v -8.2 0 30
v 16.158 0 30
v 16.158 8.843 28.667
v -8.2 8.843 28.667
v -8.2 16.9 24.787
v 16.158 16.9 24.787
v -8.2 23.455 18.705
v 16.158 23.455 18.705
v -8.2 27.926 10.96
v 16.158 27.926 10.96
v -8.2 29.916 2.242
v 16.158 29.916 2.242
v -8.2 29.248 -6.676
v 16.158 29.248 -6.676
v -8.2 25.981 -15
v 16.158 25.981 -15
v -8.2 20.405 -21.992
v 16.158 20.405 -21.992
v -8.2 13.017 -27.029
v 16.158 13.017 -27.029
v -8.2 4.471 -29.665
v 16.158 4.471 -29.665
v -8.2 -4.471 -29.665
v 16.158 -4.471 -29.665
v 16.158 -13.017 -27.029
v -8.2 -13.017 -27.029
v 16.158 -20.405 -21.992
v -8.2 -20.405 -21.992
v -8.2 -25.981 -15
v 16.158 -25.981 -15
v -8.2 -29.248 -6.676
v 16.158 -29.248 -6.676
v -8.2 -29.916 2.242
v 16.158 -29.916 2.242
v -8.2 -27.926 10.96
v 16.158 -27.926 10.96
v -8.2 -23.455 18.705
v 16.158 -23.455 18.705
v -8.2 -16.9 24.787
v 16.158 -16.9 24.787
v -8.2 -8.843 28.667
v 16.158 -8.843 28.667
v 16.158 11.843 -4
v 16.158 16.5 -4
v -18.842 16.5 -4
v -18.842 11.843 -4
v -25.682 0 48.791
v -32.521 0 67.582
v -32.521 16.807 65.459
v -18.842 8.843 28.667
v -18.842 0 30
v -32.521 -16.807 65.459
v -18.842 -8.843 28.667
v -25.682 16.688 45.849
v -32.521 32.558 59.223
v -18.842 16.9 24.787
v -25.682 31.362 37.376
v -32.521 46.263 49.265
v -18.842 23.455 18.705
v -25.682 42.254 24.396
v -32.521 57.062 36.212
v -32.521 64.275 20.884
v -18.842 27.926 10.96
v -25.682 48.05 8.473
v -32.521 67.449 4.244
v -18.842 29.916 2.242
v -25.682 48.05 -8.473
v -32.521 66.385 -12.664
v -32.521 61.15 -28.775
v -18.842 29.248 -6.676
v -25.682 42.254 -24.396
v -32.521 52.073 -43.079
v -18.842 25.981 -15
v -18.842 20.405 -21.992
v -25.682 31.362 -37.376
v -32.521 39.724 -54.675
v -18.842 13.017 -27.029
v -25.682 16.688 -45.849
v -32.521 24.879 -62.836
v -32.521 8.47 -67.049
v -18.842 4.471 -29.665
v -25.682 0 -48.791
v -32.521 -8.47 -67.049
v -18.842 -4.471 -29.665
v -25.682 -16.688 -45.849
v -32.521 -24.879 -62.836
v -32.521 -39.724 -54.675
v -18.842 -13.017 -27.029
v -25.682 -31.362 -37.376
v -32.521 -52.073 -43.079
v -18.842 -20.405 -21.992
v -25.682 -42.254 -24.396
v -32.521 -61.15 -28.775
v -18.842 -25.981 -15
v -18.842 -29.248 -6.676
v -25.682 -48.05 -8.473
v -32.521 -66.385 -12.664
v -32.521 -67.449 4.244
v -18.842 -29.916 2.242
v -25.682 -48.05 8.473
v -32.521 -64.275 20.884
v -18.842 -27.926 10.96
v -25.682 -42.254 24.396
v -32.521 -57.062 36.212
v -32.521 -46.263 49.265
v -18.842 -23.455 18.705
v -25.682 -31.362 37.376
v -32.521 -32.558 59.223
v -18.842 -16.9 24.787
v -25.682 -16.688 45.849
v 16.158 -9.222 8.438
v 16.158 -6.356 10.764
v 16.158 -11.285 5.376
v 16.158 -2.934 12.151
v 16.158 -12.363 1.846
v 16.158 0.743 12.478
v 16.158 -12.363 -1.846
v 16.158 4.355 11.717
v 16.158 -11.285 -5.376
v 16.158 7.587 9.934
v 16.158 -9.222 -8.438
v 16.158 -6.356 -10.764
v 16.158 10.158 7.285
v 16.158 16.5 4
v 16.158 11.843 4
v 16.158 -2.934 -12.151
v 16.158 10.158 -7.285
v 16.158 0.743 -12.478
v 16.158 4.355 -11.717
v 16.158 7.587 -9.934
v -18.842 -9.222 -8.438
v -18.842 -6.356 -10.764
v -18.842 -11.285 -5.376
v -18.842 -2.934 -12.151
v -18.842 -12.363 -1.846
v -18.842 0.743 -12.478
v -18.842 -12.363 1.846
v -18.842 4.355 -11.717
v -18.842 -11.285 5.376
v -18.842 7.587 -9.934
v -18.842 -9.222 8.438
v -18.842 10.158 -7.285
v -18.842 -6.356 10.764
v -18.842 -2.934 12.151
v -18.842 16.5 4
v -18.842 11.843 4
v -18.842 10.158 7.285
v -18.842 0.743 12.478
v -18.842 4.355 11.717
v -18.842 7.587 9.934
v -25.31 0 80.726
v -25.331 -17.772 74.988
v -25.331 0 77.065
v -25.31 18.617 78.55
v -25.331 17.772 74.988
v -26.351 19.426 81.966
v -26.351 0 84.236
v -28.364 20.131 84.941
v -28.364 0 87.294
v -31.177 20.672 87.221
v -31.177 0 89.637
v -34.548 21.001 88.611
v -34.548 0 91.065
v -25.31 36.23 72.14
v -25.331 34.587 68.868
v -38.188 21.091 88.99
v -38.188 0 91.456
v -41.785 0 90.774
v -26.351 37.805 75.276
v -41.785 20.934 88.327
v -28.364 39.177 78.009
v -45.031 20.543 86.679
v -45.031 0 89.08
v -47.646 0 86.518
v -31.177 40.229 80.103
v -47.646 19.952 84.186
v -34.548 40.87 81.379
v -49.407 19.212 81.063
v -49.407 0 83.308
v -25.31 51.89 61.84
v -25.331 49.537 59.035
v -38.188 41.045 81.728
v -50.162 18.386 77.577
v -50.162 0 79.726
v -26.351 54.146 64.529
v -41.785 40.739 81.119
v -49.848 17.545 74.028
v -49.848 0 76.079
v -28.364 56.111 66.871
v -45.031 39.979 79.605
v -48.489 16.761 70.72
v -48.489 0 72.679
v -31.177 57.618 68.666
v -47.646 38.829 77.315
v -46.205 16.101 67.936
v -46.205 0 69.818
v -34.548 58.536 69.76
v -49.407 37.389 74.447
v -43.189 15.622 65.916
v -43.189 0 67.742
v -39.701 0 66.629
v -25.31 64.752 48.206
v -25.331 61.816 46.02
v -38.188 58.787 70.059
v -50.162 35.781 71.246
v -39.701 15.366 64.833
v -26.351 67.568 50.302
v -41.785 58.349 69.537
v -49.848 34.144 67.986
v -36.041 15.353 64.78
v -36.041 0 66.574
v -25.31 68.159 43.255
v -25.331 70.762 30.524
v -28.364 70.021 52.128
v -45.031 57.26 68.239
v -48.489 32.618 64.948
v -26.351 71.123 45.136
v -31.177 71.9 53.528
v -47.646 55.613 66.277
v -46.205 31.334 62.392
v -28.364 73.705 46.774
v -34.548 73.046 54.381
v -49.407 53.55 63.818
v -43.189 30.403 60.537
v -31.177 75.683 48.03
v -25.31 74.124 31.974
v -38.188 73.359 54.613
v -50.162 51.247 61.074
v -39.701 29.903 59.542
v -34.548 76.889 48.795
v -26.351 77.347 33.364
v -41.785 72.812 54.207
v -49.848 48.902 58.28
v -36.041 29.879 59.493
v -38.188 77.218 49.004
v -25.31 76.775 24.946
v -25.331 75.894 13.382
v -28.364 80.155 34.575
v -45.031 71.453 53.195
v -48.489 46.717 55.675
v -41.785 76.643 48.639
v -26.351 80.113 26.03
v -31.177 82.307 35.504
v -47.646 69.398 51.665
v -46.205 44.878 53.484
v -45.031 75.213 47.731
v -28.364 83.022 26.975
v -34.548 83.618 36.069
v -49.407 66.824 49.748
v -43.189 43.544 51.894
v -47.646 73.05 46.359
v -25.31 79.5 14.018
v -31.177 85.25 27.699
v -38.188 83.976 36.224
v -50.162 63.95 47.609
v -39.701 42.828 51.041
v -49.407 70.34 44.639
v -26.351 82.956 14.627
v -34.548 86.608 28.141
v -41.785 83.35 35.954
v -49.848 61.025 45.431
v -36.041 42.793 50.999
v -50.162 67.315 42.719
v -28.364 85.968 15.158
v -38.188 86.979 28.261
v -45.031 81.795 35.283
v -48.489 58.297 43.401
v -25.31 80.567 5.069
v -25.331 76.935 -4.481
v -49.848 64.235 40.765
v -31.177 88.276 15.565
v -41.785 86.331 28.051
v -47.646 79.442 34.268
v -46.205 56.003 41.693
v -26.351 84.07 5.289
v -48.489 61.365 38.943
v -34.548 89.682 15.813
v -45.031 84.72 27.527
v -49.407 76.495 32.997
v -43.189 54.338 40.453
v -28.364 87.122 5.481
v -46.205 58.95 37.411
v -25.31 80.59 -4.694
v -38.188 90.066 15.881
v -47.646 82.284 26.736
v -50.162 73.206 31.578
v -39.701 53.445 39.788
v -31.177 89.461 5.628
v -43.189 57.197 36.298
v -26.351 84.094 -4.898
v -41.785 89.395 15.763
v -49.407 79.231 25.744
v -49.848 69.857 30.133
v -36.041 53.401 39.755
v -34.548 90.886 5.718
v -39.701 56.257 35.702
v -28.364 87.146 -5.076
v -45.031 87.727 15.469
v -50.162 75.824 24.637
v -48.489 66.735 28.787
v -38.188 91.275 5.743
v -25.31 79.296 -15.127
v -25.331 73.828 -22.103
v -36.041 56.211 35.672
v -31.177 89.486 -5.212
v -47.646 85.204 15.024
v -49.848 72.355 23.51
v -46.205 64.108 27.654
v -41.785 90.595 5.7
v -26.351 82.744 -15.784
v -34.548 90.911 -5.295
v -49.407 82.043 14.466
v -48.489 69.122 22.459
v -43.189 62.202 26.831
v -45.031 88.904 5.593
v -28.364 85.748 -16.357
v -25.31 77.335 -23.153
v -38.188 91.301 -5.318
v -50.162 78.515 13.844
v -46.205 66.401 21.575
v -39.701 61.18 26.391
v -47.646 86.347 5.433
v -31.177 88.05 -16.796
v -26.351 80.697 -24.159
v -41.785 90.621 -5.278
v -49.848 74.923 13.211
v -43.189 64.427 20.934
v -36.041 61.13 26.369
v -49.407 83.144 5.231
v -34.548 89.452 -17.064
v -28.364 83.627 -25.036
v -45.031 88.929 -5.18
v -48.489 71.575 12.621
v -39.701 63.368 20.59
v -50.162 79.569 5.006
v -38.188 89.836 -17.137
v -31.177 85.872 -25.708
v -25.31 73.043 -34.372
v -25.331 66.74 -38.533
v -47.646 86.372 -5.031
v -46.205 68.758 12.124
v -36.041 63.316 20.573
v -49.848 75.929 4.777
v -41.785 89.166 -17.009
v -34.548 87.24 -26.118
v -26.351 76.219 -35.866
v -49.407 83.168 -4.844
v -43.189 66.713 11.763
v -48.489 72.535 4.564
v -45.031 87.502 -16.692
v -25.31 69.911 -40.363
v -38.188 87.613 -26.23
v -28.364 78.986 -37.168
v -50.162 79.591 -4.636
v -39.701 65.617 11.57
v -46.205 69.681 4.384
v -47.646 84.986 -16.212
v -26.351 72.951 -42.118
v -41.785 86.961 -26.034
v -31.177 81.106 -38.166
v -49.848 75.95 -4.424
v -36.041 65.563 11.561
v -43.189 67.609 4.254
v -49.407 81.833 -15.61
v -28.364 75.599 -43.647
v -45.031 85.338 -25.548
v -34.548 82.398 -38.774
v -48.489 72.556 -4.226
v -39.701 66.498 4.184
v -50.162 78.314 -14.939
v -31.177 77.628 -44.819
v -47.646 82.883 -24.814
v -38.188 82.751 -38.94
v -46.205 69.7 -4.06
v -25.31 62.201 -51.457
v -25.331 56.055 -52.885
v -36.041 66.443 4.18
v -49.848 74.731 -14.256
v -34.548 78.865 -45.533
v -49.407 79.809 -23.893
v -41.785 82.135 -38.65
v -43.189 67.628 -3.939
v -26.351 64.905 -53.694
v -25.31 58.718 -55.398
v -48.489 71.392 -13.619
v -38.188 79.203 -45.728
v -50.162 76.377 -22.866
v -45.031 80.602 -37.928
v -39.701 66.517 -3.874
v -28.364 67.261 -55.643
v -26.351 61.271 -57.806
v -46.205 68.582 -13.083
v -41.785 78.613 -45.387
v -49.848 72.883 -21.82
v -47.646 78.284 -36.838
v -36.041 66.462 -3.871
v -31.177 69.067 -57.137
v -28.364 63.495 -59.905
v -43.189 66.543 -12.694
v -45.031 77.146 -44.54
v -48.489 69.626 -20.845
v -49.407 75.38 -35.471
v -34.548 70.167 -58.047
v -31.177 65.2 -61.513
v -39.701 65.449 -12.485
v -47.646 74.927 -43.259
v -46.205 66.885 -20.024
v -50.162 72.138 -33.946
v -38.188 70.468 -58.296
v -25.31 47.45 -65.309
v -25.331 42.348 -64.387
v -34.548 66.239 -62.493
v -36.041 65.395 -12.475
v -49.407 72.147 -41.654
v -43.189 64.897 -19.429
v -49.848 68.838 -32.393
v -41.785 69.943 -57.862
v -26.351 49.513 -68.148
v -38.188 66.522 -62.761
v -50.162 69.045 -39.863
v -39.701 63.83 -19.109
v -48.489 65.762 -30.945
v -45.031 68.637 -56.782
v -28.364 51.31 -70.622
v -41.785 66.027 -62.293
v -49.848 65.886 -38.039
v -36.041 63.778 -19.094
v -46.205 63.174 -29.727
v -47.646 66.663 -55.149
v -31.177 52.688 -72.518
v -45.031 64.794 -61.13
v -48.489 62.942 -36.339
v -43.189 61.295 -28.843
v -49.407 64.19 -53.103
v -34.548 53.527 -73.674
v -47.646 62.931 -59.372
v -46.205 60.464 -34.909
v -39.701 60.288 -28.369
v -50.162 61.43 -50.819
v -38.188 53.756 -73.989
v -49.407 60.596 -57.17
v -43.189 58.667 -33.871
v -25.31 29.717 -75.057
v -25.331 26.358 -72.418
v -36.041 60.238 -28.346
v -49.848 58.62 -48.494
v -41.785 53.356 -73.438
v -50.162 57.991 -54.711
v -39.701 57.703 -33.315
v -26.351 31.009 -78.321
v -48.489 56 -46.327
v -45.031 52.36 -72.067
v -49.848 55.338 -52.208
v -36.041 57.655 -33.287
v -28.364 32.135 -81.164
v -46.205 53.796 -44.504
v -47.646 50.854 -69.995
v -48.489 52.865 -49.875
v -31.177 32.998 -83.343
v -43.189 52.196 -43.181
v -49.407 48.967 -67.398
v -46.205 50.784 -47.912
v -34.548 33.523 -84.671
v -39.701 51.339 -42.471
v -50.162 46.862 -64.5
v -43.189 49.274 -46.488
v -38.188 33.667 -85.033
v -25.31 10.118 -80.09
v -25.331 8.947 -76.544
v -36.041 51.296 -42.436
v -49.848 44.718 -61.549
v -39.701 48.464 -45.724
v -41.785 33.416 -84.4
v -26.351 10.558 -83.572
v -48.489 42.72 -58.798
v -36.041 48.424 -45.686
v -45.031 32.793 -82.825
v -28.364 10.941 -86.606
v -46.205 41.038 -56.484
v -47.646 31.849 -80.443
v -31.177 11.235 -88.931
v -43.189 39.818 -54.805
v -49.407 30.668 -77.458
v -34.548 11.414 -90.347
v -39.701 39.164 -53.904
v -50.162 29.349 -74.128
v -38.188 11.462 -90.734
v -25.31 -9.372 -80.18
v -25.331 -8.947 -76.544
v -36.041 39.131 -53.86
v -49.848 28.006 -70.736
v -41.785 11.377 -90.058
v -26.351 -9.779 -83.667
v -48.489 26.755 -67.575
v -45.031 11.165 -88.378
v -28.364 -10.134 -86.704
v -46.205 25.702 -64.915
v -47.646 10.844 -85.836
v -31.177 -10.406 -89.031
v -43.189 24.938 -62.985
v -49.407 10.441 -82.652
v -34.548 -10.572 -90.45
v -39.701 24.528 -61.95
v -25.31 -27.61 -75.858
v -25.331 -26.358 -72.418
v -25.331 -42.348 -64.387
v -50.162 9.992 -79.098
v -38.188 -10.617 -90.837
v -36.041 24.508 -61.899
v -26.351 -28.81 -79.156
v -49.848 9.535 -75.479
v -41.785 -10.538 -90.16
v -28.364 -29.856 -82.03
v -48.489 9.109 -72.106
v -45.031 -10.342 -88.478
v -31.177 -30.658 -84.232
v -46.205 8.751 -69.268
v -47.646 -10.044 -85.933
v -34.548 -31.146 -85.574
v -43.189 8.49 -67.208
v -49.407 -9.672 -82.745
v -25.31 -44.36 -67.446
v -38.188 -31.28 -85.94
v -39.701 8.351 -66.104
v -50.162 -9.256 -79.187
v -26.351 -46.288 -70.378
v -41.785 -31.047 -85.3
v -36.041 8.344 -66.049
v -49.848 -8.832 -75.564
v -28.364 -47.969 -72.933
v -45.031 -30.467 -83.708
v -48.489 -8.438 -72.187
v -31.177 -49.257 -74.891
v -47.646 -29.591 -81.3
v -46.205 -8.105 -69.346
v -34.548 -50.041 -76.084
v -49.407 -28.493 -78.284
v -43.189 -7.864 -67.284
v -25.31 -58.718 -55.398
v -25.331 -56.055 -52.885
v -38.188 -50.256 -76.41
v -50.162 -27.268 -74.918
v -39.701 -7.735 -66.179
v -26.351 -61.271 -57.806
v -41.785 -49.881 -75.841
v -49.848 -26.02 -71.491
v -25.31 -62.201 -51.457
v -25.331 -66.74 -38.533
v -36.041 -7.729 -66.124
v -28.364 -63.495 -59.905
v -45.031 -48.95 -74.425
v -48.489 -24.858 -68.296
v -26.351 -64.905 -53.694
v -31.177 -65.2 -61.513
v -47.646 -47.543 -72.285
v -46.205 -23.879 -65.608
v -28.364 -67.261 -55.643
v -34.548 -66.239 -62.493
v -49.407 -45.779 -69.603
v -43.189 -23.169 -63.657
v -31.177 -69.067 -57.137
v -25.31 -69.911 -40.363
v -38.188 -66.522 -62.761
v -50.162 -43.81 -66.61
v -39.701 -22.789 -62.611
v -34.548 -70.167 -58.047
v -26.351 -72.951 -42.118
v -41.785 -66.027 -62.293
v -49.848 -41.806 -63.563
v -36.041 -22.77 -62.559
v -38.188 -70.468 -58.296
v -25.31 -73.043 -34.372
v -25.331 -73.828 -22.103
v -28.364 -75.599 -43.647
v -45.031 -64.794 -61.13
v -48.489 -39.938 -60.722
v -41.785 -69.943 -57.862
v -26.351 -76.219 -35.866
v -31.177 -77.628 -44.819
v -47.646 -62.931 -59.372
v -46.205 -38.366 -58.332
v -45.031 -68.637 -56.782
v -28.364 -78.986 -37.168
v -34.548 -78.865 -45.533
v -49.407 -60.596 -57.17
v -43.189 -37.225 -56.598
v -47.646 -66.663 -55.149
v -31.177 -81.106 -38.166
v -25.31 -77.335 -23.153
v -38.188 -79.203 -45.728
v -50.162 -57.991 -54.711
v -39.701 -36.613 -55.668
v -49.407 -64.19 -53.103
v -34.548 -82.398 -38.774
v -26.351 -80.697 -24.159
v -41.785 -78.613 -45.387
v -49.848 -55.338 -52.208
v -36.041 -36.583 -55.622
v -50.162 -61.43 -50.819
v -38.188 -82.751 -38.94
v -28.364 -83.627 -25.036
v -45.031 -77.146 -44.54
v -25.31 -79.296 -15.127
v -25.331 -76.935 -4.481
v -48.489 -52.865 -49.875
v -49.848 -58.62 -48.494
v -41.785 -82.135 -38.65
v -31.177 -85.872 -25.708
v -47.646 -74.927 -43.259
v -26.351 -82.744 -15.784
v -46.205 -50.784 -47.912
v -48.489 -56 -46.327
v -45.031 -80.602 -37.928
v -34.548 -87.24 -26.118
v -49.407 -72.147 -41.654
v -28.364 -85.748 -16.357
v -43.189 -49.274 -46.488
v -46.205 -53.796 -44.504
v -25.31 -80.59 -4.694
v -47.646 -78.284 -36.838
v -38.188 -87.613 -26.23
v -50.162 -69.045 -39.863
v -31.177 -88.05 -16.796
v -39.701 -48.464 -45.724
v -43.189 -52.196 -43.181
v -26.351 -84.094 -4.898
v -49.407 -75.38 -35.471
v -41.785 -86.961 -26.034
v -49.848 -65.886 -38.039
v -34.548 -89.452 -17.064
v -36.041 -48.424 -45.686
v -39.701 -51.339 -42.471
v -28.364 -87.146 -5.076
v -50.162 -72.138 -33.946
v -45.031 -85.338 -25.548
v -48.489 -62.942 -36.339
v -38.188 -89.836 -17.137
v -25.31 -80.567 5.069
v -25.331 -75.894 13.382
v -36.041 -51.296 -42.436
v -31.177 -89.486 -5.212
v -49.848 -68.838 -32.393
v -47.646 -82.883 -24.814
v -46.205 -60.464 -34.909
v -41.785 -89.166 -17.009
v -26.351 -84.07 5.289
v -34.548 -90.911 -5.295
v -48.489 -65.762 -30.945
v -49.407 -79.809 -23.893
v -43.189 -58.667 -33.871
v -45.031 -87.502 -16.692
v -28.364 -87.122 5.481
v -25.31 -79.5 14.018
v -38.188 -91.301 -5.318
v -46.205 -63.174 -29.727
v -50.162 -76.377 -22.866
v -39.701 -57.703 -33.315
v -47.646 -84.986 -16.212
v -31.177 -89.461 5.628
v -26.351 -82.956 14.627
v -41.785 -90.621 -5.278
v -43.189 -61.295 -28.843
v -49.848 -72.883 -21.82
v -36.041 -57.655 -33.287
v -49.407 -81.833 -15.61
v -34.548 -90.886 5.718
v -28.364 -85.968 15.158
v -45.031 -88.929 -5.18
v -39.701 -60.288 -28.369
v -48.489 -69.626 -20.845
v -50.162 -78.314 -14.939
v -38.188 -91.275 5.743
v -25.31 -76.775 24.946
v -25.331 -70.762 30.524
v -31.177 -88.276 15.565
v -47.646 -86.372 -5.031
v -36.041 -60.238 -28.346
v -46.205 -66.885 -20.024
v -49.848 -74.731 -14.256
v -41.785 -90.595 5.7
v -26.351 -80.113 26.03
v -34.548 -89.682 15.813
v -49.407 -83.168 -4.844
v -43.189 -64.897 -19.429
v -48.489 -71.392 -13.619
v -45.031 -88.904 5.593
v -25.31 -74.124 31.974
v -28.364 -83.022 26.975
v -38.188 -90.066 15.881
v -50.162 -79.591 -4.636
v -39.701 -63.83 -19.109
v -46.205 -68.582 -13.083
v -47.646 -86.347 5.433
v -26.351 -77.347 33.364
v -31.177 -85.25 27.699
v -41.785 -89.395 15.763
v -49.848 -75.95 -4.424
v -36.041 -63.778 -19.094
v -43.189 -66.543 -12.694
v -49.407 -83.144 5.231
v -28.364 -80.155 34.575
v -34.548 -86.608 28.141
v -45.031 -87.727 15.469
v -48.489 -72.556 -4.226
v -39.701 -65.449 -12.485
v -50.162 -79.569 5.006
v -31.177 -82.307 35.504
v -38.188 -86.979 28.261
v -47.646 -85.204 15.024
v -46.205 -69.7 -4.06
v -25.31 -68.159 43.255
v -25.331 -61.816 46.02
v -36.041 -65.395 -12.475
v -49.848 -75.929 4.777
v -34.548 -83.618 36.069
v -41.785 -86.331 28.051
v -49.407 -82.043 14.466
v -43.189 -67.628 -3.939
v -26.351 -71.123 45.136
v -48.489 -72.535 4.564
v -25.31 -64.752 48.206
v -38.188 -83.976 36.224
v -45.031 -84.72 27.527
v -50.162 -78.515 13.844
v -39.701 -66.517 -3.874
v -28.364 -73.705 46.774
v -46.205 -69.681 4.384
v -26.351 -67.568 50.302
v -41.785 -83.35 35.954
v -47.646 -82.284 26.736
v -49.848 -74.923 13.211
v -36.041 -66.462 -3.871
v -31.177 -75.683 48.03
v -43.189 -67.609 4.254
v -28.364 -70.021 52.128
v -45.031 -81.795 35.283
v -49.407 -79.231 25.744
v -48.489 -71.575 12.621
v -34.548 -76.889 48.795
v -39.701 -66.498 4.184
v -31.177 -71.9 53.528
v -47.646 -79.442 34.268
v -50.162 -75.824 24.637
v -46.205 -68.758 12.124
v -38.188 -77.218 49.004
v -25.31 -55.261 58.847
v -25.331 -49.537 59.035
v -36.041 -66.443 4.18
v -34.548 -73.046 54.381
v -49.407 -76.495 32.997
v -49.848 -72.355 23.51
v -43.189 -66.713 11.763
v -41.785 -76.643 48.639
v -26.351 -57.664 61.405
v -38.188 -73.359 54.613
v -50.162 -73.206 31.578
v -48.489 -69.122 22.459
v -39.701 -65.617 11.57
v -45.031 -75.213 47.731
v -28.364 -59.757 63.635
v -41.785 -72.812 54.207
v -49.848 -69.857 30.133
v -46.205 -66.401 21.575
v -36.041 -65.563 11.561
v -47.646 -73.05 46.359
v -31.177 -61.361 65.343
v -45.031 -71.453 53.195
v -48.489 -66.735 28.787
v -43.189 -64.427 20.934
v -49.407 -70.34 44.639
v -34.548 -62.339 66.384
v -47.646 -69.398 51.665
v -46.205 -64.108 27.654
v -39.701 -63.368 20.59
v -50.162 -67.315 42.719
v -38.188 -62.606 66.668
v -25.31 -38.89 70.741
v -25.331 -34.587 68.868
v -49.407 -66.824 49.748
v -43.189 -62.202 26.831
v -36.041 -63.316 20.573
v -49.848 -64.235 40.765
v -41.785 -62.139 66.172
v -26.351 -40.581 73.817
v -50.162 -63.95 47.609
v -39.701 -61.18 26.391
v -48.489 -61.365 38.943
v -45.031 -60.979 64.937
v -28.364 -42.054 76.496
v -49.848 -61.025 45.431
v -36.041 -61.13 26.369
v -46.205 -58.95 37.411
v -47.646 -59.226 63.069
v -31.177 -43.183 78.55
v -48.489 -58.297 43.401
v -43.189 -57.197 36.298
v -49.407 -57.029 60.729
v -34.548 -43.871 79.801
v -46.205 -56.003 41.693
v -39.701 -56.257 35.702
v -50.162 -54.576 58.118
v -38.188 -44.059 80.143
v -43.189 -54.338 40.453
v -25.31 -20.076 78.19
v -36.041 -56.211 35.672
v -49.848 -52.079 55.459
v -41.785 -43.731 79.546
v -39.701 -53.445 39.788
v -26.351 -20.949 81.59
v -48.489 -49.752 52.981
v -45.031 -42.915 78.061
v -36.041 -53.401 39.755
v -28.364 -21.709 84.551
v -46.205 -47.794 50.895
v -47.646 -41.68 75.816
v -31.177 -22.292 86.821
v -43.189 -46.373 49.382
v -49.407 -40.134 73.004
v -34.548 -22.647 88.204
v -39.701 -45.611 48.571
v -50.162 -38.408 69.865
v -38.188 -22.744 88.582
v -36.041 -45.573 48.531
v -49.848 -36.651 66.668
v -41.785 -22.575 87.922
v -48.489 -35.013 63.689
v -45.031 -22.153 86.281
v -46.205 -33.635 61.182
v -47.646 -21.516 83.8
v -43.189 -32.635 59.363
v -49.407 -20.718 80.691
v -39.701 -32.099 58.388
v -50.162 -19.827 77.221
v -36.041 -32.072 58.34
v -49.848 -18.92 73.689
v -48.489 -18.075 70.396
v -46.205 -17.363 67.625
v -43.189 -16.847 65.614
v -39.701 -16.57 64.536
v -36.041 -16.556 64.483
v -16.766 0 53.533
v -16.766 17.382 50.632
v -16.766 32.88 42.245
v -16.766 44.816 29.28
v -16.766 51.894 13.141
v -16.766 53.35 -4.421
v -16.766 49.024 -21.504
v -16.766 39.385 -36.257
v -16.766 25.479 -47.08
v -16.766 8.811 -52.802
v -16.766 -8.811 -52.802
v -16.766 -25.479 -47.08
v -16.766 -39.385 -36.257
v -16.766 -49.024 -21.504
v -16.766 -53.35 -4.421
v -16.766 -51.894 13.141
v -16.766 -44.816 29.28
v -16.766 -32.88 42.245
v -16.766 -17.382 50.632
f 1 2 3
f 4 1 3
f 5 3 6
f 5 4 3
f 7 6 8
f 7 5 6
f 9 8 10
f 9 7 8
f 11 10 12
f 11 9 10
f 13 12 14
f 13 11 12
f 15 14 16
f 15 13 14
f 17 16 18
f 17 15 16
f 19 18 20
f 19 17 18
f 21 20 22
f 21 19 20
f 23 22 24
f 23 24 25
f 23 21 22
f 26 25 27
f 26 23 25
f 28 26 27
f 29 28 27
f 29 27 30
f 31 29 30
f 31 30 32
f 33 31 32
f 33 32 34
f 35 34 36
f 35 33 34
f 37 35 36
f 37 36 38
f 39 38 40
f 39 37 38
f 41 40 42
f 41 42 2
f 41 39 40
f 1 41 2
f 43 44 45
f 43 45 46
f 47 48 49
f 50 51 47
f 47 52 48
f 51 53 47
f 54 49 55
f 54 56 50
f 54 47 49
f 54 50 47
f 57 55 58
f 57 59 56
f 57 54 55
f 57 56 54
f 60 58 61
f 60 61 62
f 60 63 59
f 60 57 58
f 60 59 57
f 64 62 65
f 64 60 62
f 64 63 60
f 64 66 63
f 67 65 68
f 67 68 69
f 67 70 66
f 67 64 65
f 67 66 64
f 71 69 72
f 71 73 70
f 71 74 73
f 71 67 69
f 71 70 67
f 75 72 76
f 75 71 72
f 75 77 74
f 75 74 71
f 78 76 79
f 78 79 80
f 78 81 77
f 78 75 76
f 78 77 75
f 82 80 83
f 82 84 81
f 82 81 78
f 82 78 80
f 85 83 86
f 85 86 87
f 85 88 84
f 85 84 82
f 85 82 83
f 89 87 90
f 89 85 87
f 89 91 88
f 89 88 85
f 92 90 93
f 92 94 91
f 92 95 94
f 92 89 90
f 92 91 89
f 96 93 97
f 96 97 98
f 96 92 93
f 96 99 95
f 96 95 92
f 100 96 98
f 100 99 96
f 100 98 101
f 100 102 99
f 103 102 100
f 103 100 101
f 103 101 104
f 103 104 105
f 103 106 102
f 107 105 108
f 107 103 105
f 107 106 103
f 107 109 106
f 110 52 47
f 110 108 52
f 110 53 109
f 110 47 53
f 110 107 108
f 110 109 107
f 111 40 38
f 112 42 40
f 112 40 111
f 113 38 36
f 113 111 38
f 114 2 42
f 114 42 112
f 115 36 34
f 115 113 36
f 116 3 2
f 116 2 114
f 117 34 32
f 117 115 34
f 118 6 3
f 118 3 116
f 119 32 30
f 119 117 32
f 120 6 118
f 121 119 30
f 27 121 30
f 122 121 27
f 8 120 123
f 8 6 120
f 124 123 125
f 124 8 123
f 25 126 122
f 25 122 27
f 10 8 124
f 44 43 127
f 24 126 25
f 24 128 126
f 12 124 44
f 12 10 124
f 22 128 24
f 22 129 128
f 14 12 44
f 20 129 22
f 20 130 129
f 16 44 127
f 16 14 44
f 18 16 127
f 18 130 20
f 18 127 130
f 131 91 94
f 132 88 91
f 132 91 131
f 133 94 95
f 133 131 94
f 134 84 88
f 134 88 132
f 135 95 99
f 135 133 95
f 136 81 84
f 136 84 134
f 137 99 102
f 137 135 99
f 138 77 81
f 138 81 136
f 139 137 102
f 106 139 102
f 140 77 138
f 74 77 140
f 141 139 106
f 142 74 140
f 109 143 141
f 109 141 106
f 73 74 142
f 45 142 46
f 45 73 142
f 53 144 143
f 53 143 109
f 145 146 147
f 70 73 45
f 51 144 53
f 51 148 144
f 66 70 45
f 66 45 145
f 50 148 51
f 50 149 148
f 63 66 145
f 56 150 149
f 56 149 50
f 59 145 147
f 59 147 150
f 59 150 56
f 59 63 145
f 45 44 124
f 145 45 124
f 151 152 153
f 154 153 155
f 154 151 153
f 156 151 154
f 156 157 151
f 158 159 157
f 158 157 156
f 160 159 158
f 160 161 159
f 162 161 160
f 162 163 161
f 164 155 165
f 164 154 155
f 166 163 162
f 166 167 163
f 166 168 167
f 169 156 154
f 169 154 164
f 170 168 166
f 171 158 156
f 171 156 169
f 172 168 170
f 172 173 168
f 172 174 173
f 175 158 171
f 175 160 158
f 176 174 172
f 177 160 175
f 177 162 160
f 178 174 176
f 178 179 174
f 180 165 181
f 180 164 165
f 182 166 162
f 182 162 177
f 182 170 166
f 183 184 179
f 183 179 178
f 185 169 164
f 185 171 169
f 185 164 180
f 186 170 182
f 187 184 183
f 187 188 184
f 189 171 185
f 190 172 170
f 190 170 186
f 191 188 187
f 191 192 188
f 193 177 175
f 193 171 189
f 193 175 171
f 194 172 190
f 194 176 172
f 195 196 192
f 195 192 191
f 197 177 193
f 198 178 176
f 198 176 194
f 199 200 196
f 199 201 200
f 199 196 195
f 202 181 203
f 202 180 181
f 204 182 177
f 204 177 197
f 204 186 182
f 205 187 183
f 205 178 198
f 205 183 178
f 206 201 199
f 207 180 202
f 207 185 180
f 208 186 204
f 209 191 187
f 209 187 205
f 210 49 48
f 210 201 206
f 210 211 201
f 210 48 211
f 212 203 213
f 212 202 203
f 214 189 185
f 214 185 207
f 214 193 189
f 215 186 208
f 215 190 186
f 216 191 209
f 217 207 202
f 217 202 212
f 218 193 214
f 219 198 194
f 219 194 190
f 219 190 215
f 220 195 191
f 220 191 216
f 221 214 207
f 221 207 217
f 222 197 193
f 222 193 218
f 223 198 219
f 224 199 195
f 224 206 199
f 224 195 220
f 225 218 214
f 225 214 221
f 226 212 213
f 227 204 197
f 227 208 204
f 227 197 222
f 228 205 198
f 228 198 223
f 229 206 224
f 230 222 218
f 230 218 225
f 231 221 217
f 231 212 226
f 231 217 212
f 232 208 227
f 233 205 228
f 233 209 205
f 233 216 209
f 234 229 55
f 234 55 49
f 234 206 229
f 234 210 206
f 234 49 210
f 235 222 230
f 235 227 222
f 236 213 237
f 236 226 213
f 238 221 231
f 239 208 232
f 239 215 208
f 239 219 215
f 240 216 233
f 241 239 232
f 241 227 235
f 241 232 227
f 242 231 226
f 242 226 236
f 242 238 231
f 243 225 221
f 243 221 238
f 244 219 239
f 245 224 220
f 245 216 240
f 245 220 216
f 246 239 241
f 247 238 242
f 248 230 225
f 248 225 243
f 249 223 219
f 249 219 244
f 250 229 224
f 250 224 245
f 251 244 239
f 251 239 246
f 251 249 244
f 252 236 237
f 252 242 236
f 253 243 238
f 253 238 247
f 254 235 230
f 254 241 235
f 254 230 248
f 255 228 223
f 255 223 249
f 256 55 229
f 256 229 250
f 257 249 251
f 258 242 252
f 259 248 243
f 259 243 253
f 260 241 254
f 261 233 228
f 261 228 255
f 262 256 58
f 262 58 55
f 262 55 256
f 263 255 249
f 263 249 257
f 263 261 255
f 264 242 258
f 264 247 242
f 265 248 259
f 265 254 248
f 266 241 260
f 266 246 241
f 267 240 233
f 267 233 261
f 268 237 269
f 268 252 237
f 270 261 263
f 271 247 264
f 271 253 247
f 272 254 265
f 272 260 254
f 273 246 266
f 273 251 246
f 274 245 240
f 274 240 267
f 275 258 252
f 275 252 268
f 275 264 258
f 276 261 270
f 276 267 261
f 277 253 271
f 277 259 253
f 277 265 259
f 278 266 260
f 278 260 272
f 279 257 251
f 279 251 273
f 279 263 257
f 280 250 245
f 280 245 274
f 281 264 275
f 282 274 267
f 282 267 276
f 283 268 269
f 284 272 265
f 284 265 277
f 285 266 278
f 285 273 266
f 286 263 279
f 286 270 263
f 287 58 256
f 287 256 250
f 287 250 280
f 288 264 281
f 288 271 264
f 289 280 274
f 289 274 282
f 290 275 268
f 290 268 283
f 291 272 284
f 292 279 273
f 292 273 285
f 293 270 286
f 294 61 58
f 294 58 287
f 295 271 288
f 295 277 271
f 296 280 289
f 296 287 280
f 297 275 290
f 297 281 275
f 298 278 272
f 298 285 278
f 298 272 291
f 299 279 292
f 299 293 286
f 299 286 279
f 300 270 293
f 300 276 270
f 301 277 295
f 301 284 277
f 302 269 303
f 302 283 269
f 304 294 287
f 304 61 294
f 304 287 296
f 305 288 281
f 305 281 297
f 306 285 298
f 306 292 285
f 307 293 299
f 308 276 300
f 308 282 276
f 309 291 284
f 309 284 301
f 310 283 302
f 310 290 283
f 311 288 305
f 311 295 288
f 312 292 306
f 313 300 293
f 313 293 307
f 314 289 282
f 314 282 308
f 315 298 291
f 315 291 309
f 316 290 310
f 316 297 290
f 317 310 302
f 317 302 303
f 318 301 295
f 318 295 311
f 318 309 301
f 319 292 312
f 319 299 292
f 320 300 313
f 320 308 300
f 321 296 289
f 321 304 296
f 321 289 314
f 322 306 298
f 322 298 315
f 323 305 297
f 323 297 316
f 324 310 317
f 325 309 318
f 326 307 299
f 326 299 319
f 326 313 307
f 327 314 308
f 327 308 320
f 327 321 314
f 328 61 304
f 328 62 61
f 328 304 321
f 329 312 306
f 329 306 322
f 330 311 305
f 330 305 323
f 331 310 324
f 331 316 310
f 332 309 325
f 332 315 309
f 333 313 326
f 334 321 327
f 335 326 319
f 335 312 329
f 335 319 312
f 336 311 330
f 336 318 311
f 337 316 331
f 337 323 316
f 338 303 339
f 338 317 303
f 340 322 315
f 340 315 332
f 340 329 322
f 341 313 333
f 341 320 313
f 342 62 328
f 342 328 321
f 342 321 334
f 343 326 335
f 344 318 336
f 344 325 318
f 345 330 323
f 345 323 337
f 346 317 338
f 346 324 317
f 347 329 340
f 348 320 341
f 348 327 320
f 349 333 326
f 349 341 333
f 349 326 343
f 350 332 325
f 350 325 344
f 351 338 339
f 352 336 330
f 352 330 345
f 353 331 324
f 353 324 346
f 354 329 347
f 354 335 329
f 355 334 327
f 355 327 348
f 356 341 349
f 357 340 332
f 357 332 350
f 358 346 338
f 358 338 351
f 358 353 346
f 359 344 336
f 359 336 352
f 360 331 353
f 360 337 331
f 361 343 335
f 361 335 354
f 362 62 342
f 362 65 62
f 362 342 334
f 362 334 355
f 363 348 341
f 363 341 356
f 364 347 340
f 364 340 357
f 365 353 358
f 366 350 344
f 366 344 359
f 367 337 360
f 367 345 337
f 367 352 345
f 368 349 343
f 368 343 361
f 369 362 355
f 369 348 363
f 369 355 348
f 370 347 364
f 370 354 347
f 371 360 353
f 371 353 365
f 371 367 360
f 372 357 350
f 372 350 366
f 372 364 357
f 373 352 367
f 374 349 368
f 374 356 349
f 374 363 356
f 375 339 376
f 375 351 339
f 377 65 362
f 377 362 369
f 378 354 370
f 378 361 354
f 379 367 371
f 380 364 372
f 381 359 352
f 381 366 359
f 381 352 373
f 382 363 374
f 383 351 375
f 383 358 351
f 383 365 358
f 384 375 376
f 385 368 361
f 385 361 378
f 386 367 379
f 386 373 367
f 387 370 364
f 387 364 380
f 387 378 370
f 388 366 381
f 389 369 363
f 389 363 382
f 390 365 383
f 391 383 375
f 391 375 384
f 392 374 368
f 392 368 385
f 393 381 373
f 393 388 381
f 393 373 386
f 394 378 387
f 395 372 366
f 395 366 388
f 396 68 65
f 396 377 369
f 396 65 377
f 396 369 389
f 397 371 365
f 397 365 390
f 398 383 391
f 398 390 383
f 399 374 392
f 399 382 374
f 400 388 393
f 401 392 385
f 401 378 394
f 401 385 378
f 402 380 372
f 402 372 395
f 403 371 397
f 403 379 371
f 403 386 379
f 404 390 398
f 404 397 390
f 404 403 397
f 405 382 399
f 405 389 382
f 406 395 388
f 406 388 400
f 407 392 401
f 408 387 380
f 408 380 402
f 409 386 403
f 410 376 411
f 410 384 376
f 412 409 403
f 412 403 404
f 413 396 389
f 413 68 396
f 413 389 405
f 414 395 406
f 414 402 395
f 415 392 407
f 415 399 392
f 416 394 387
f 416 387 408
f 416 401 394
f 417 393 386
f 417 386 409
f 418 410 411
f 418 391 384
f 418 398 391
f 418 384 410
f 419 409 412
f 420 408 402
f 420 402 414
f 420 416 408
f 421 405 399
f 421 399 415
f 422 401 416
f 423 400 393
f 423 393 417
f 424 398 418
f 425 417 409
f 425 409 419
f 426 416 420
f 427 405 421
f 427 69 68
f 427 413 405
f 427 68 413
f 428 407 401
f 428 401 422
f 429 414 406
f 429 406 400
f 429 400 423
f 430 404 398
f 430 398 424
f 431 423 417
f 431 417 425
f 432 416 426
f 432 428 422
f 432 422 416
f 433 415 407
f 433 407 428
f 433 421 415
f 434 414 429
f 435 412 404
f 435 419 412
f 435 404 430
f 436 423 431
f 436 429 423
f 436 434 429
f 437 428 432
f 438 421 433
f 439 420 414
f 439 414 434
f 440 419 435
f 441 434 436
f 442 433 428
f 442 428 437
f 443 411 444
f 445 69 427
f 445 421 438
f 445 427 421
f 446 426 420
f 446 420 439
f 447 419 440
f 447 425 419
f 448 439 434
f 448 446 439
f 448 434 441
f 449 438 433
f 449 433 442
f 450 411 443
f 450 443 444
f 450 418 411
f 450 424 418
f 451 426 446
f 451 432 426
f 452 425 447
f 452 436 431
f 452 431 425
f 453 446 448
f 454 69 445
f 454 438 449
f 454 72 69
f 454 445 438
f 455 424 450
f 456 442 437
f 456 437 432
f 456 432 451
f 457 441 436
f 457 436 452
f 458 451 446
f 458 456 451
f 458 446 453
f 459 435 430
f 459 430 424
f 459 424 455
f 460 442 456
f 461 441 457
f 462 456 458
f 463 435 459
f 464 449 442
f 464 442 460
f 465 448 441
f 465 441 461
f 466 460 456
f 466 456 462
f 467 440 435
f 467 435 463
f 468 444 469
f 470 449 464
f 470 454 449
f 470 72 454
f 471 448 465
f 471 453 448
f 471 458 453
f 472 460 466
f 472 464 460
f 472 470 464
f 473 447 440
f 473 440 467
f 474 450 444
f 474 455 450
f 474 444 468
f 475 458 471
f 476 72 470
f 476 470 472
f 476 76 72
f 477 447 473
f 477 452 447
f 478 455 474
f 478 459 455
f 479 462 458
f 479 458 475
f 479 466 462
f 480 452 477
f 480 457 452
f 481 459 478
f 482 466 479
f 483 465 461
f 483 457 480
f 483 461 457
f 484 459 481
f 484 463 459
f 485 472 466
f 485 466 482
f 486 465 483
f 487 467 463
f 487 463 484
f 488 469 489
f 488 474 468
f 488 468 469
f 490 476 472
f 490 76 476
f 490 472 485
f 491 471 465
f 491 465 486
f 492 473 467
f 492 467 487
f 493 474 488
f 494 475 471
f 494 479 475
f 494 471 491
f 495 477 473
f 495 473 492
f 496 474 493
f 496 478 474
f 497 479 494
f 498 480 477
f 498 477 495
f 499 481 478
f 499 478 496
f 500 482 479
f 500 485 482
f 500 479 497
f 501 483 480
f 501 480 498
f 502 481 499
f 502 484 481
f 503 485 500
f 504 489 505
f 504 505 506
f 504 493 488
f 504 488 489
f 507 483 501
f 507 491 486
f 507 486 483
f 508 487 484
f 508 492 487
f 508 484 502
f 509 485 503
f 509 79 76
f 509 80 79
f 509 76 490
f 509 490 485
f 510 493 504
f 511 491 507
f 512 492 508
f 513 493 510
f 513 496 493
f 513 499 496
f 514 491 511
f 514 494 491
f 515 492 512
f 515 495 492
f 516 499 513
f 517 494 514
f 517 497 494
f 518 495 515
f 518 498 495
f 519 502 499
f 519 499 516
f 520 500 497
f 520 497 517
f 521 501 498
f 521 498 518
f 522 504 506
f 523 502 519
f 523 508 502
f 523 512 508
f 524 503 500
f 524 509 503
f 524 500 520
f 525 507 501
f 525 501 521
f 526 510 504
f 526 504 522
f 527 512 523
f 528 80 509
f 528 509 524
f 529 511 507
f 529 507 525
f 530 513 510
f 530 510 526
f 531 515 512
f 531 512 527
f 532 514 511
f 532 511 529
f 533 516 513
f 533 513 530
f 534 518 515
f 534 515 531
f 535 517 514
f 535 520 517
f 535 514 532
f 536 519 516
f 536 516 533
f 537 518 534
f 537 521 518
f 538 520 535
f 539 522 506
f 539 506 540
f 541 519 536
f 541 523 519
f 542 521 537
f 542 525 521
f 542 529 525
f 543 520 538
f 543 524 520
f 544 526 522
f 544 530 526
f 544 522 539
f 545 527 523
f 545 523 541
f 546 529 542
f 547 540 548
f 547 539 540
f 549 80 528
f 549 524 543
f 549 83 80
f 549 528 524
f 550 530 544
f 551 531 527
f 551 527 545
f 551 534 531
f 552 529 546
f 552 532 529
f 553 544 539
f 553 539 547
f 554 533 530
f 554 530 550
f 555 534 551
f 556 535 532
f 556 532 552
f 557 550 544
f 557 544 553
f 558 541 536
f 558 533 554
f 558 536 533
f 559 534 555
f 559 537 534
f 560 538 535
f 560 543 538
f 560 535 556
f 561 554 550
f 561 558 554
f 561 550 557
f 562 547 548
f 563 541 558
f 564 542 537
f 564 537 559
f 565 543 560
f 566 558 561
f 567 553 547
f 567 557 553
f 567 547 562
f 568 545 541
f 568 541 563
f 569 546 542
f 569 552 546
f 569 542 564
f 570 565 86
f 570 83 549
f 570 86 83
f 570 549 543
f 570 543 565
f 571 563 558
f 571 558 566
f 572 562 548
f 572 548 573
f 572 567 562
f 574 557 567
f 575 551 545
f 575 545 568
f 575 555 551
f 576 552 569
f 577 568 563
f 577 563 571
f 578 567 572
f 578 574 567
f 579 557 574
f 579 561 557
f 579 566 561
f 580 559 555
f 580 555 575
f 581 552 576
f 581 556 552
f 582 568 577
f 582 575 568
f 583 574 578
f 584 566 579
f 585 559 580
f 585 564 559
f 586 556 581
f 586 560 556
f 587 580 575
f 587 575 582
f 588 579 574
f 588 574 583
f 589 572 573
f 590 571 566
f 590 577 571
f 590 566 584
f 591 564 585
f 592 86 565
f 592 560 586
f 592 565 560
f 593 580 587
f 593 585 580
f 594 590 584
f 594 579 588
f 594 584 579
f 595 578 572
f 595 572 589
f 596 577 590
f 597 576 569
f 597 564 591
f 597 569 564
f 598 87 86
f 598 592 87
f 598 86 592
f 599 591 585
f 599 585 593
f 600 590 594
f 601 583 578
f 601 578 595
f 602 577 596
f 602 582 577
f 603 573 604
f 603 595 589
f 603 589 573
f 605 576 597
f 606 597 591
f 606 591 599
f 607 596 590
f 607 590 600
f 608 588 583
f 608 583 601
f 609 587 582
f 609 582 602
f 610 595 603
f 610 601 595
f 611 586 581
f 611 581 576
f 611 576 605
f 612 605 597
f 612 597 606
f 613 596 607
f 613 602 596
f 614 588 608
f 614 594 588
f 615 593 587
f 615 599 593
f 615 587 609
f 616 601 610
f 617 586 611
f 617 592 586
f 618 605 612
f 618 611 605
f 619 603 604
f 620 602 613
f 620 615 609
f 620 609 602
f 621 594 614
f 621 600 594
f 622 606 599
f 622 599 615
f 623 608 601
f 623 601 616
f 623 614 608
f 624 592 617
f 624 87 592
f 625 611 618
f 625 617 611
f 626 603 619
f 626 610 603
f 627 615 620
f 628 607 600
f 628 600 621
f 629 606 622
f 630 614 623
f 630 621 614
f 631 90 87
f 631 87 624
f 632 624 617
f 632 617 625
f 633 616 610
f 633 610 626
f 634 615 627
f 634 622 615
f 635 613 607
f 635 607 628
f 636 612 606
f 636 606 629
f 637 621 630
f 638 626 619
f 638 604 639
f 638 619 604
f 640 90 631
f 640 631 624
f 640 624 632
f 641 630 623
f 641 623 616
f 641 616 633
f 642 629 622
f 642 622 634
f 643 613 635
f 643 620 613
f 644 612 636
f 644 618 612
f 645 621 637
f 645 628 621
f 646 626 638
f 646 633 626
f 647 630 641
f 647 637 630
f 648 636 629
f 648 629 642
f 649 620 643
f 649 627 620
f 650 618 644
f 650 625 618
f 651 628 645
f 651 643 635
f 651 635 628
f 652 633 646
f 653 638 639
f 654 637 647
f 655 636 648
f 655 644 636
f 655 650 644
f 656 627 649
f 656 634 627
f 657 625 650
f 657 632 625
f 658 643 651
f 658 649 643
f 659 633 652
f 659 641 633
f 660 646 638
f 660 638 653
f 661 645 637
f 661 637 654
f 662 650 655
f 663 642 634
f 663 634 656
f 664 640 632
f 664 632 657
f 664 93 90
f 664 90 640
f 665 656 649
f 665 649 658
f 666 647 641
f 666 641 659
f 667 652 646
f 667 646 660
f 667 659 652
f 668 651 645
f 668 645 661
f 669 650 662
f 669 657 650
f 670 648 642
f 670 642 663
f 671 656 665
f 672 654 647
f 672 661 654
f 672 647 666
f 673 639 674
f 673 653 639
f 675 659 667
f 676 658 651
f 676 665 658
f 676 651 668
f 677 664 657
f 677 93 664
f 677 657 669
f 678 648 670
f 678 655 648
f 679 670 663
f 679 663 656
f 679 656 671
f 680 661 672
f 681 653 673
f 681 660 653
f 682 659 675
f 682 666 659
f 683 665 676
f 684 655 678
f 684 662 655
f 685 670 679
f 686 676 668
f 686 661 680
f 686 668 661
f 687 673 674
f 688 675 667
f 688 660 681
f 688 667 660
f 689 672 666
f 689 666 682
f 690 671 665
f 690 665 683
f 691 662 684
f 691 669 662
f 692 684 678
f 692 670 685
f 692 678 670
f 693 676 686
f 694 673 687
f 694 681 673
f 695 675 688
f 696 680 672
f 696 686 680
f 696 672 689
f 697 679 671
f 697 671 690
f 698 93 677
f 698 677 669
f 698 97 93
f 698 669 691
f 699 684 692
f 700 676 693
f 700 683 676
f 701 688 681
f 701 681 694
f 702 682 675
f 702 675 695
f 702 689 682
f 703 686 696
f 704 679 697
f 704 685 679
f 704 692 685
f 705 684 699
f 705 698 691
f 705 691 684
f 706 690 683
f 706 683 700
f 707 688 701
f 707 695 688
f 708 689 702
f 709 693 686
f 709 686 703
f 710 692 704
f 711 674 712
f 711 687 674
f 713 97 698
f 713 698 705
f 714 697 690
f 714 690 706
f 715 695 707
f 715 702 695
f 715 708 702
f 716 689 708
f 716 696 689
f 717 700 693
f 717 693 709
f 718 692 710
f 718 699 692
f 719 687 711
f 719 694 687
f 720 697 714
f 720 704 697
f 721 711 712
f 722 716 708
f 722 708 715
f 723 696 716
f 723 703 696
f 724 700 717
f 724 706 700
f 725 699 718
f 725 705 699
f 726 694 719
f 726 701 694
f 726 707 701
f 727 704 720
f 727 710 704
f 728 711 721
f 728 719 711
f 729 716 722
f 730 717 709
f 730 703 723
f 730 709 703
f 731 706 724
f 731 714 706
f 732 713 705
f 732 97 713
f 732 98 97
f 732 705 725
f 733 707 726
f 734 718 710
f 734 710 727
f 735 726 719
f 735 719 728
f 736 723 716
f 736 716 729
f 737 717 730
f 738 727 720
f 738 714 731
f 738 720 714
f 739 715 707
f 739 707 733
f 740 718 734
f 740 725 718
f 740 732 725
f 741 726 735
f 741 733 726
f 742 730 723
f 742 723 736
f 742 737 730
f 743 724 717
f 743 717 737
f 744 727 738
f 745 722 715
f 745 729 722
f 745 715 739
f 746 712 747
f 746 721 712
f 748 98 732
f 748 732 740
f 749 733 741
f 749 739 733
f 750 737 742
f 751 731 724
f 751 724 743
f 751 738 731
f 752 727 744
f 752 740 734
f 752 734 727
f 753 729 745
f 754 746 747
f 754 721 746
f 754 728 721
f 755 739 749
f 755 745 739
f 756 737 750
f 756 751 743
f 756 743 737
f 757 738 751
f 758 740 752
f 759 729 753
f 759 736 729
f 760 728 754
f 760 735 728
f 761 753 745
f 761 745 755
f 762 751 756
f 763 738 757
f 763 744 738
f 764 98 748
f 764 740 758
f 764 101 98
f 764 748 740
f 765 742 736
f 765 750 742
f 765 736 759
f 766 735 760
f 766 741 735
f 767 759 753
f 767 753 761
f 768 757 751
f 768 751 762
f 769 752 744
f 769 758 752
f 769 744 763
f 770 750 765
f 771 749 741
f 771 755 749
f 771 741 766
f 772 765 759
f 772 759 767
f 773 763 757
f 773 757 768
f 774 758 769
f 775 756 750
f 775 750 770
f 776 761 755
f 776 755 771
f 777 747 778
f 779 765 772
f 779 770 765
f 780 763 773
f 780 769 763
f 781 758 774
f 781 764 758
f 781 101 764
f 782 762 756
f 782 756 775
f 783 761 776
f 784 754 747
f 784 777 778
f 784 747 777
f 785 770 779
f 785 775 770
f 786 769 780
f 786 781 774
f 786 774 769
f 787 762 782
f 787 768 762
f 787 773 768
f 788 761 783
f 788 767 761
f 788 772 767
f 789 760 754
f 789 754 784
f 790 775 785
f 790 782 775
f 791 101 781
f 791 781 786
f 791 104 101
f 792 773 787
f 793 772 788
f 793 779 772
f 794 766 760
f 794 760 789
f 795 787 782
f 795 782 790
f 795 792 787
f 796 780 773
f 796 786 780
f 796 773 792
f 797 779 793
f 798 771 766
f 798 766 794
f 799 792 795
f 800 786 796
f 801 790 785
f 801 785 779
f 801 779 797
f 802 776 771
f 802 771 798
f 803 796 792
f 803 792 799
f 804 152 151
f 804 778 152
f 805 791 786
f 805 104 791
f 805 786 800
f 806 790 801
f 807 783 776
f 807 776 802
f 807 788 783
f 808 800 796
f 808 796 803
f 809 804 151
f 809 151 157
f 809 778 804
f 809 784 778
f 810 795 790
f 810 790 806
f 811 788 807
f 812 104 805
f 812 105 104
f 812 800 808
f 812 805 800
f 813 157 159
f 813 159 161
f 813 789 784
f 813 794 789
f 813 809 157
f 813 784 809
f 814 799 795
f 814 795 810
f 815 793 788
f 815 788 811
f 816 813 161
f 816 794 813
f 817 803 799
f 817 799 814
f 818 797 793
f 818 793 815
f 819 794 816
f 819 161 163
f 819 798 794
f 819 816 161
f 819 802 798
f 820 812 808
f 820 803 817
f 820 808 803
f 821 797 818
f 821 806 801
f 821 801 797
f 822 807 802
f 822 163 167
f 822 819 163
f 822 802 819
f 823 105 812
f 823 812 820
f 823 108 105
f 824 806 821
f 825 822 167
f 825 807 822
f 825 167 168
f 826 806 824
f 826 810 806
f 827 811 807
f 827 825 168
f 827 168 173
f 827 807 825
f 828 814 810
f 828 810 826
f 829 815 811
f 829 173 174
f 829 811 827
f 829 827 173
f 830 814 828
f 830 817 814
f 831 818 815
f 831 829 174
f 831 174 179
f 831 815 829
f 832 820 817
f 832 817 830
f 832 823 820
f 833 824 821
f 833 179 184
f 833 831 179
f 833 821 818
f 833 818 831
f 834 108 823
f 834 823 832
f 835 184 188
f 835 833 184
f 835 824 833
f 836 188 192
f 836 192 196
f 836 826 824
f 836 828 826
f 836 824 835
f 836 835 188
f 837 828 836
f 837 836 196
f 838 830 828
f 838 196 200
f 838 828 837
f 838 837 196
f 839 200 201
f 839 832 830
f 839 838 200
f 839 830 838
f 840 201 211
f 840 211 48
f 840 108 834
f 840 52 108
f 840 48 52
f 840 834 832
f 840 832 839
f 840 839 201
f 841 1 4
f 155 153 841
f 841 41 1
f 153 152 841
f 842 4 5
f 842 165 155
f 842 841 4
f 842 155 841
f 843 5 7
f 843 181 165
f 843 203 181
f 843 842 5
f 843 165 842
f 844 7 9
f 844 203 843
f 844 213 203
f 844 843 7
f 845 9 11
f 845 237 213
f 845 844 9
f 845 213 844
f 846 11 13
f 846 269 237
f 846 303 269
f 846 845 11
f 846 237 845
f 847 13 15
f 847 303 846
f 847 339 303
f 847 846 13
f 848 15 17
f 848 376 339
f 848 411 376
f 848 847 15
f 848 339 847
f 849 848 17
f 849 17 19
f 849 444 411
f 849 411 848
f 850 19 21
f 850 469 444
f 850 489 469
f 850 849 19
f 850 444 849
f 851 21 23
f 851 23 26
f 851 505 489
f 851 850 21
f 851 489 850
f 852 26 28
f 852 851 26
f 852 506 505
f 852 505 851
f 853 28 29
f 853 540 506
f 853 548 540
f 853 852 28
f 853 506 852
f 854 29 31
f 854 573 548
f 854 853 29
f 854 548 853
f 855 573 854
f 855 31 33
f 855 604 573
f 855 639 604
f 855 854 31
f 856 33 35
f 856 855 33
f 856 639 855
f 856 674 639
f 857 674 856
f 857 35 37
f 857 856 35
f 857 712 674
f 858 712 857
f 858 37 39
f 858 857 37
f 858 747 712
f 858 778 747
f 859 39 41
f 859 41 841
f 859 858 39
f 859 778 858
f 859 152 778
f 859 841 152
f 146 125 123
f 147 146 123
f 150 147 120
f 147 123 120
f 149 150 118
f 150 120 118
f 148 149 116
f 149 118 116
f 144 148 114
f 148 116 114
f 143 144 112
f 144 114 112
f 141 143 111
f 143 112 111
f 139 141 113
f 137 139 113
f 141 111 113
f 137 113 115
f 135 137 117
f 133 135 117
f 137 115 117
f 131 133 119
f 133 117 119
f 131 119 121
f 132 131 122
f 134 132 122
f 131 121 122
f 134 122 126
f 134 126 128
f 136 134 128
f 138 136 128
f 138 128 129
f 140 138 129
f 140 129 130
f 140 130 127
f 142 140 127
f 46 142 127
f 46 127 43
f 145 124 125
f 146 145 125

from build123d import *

# Parameters (mm, degrees)
F3_D     = 25
F2_W     = 8
F2_H     = 8
F4_DEPTH = 50


with BuildPart() as f1:
    # F0 (on Front) → F1 (revolve)
    with BuildSketch(Plane.XZ):
        with BuildLine():
            Line((16.157746, 30), (-8.200476, 30))
            Line((-8.200476, 30), (-25.330789, 77.065149))
            ThreePointArc((-25.330789, 77.065149), (-47.645877, 86.518166), (-32.521118, 67.582371))
            Line((-32.521118, 67.582371), (-18.842254, 30))
            Line((-18.842254, 30), (-18.842254, 0))
            Line((-18.842254, 0), (16.157746, 0))
            Line((16.157746, 0), (16.157746, 30))
        make_face()
    revolve(axis=Axis((-63.210286, 0, 0), (-1, 0, 0)))

    # F3 (through all)
    with Locations(Plane(origin=(-18.842254, 0, 0), x_dir=(0, -1, 0), z_dir=(-1, 0, 0))):
        with Locations((0, 0)):
            Hole(F3_D / 2)

    # F2 (on face) → F4 (cut)
    with BuildSketch(Plane(origin=(-18.842254, 0, 0), x_dir=(0, -1, 0), z_dir=(-1, 0, 0))):
        with Locations((-12.5, 0)):
            Rectangle(F2_W, F2_H)
    extrude(amount=-F4_DEPTH, mode=Mode.SUBTRACT)


solid = f1.part
